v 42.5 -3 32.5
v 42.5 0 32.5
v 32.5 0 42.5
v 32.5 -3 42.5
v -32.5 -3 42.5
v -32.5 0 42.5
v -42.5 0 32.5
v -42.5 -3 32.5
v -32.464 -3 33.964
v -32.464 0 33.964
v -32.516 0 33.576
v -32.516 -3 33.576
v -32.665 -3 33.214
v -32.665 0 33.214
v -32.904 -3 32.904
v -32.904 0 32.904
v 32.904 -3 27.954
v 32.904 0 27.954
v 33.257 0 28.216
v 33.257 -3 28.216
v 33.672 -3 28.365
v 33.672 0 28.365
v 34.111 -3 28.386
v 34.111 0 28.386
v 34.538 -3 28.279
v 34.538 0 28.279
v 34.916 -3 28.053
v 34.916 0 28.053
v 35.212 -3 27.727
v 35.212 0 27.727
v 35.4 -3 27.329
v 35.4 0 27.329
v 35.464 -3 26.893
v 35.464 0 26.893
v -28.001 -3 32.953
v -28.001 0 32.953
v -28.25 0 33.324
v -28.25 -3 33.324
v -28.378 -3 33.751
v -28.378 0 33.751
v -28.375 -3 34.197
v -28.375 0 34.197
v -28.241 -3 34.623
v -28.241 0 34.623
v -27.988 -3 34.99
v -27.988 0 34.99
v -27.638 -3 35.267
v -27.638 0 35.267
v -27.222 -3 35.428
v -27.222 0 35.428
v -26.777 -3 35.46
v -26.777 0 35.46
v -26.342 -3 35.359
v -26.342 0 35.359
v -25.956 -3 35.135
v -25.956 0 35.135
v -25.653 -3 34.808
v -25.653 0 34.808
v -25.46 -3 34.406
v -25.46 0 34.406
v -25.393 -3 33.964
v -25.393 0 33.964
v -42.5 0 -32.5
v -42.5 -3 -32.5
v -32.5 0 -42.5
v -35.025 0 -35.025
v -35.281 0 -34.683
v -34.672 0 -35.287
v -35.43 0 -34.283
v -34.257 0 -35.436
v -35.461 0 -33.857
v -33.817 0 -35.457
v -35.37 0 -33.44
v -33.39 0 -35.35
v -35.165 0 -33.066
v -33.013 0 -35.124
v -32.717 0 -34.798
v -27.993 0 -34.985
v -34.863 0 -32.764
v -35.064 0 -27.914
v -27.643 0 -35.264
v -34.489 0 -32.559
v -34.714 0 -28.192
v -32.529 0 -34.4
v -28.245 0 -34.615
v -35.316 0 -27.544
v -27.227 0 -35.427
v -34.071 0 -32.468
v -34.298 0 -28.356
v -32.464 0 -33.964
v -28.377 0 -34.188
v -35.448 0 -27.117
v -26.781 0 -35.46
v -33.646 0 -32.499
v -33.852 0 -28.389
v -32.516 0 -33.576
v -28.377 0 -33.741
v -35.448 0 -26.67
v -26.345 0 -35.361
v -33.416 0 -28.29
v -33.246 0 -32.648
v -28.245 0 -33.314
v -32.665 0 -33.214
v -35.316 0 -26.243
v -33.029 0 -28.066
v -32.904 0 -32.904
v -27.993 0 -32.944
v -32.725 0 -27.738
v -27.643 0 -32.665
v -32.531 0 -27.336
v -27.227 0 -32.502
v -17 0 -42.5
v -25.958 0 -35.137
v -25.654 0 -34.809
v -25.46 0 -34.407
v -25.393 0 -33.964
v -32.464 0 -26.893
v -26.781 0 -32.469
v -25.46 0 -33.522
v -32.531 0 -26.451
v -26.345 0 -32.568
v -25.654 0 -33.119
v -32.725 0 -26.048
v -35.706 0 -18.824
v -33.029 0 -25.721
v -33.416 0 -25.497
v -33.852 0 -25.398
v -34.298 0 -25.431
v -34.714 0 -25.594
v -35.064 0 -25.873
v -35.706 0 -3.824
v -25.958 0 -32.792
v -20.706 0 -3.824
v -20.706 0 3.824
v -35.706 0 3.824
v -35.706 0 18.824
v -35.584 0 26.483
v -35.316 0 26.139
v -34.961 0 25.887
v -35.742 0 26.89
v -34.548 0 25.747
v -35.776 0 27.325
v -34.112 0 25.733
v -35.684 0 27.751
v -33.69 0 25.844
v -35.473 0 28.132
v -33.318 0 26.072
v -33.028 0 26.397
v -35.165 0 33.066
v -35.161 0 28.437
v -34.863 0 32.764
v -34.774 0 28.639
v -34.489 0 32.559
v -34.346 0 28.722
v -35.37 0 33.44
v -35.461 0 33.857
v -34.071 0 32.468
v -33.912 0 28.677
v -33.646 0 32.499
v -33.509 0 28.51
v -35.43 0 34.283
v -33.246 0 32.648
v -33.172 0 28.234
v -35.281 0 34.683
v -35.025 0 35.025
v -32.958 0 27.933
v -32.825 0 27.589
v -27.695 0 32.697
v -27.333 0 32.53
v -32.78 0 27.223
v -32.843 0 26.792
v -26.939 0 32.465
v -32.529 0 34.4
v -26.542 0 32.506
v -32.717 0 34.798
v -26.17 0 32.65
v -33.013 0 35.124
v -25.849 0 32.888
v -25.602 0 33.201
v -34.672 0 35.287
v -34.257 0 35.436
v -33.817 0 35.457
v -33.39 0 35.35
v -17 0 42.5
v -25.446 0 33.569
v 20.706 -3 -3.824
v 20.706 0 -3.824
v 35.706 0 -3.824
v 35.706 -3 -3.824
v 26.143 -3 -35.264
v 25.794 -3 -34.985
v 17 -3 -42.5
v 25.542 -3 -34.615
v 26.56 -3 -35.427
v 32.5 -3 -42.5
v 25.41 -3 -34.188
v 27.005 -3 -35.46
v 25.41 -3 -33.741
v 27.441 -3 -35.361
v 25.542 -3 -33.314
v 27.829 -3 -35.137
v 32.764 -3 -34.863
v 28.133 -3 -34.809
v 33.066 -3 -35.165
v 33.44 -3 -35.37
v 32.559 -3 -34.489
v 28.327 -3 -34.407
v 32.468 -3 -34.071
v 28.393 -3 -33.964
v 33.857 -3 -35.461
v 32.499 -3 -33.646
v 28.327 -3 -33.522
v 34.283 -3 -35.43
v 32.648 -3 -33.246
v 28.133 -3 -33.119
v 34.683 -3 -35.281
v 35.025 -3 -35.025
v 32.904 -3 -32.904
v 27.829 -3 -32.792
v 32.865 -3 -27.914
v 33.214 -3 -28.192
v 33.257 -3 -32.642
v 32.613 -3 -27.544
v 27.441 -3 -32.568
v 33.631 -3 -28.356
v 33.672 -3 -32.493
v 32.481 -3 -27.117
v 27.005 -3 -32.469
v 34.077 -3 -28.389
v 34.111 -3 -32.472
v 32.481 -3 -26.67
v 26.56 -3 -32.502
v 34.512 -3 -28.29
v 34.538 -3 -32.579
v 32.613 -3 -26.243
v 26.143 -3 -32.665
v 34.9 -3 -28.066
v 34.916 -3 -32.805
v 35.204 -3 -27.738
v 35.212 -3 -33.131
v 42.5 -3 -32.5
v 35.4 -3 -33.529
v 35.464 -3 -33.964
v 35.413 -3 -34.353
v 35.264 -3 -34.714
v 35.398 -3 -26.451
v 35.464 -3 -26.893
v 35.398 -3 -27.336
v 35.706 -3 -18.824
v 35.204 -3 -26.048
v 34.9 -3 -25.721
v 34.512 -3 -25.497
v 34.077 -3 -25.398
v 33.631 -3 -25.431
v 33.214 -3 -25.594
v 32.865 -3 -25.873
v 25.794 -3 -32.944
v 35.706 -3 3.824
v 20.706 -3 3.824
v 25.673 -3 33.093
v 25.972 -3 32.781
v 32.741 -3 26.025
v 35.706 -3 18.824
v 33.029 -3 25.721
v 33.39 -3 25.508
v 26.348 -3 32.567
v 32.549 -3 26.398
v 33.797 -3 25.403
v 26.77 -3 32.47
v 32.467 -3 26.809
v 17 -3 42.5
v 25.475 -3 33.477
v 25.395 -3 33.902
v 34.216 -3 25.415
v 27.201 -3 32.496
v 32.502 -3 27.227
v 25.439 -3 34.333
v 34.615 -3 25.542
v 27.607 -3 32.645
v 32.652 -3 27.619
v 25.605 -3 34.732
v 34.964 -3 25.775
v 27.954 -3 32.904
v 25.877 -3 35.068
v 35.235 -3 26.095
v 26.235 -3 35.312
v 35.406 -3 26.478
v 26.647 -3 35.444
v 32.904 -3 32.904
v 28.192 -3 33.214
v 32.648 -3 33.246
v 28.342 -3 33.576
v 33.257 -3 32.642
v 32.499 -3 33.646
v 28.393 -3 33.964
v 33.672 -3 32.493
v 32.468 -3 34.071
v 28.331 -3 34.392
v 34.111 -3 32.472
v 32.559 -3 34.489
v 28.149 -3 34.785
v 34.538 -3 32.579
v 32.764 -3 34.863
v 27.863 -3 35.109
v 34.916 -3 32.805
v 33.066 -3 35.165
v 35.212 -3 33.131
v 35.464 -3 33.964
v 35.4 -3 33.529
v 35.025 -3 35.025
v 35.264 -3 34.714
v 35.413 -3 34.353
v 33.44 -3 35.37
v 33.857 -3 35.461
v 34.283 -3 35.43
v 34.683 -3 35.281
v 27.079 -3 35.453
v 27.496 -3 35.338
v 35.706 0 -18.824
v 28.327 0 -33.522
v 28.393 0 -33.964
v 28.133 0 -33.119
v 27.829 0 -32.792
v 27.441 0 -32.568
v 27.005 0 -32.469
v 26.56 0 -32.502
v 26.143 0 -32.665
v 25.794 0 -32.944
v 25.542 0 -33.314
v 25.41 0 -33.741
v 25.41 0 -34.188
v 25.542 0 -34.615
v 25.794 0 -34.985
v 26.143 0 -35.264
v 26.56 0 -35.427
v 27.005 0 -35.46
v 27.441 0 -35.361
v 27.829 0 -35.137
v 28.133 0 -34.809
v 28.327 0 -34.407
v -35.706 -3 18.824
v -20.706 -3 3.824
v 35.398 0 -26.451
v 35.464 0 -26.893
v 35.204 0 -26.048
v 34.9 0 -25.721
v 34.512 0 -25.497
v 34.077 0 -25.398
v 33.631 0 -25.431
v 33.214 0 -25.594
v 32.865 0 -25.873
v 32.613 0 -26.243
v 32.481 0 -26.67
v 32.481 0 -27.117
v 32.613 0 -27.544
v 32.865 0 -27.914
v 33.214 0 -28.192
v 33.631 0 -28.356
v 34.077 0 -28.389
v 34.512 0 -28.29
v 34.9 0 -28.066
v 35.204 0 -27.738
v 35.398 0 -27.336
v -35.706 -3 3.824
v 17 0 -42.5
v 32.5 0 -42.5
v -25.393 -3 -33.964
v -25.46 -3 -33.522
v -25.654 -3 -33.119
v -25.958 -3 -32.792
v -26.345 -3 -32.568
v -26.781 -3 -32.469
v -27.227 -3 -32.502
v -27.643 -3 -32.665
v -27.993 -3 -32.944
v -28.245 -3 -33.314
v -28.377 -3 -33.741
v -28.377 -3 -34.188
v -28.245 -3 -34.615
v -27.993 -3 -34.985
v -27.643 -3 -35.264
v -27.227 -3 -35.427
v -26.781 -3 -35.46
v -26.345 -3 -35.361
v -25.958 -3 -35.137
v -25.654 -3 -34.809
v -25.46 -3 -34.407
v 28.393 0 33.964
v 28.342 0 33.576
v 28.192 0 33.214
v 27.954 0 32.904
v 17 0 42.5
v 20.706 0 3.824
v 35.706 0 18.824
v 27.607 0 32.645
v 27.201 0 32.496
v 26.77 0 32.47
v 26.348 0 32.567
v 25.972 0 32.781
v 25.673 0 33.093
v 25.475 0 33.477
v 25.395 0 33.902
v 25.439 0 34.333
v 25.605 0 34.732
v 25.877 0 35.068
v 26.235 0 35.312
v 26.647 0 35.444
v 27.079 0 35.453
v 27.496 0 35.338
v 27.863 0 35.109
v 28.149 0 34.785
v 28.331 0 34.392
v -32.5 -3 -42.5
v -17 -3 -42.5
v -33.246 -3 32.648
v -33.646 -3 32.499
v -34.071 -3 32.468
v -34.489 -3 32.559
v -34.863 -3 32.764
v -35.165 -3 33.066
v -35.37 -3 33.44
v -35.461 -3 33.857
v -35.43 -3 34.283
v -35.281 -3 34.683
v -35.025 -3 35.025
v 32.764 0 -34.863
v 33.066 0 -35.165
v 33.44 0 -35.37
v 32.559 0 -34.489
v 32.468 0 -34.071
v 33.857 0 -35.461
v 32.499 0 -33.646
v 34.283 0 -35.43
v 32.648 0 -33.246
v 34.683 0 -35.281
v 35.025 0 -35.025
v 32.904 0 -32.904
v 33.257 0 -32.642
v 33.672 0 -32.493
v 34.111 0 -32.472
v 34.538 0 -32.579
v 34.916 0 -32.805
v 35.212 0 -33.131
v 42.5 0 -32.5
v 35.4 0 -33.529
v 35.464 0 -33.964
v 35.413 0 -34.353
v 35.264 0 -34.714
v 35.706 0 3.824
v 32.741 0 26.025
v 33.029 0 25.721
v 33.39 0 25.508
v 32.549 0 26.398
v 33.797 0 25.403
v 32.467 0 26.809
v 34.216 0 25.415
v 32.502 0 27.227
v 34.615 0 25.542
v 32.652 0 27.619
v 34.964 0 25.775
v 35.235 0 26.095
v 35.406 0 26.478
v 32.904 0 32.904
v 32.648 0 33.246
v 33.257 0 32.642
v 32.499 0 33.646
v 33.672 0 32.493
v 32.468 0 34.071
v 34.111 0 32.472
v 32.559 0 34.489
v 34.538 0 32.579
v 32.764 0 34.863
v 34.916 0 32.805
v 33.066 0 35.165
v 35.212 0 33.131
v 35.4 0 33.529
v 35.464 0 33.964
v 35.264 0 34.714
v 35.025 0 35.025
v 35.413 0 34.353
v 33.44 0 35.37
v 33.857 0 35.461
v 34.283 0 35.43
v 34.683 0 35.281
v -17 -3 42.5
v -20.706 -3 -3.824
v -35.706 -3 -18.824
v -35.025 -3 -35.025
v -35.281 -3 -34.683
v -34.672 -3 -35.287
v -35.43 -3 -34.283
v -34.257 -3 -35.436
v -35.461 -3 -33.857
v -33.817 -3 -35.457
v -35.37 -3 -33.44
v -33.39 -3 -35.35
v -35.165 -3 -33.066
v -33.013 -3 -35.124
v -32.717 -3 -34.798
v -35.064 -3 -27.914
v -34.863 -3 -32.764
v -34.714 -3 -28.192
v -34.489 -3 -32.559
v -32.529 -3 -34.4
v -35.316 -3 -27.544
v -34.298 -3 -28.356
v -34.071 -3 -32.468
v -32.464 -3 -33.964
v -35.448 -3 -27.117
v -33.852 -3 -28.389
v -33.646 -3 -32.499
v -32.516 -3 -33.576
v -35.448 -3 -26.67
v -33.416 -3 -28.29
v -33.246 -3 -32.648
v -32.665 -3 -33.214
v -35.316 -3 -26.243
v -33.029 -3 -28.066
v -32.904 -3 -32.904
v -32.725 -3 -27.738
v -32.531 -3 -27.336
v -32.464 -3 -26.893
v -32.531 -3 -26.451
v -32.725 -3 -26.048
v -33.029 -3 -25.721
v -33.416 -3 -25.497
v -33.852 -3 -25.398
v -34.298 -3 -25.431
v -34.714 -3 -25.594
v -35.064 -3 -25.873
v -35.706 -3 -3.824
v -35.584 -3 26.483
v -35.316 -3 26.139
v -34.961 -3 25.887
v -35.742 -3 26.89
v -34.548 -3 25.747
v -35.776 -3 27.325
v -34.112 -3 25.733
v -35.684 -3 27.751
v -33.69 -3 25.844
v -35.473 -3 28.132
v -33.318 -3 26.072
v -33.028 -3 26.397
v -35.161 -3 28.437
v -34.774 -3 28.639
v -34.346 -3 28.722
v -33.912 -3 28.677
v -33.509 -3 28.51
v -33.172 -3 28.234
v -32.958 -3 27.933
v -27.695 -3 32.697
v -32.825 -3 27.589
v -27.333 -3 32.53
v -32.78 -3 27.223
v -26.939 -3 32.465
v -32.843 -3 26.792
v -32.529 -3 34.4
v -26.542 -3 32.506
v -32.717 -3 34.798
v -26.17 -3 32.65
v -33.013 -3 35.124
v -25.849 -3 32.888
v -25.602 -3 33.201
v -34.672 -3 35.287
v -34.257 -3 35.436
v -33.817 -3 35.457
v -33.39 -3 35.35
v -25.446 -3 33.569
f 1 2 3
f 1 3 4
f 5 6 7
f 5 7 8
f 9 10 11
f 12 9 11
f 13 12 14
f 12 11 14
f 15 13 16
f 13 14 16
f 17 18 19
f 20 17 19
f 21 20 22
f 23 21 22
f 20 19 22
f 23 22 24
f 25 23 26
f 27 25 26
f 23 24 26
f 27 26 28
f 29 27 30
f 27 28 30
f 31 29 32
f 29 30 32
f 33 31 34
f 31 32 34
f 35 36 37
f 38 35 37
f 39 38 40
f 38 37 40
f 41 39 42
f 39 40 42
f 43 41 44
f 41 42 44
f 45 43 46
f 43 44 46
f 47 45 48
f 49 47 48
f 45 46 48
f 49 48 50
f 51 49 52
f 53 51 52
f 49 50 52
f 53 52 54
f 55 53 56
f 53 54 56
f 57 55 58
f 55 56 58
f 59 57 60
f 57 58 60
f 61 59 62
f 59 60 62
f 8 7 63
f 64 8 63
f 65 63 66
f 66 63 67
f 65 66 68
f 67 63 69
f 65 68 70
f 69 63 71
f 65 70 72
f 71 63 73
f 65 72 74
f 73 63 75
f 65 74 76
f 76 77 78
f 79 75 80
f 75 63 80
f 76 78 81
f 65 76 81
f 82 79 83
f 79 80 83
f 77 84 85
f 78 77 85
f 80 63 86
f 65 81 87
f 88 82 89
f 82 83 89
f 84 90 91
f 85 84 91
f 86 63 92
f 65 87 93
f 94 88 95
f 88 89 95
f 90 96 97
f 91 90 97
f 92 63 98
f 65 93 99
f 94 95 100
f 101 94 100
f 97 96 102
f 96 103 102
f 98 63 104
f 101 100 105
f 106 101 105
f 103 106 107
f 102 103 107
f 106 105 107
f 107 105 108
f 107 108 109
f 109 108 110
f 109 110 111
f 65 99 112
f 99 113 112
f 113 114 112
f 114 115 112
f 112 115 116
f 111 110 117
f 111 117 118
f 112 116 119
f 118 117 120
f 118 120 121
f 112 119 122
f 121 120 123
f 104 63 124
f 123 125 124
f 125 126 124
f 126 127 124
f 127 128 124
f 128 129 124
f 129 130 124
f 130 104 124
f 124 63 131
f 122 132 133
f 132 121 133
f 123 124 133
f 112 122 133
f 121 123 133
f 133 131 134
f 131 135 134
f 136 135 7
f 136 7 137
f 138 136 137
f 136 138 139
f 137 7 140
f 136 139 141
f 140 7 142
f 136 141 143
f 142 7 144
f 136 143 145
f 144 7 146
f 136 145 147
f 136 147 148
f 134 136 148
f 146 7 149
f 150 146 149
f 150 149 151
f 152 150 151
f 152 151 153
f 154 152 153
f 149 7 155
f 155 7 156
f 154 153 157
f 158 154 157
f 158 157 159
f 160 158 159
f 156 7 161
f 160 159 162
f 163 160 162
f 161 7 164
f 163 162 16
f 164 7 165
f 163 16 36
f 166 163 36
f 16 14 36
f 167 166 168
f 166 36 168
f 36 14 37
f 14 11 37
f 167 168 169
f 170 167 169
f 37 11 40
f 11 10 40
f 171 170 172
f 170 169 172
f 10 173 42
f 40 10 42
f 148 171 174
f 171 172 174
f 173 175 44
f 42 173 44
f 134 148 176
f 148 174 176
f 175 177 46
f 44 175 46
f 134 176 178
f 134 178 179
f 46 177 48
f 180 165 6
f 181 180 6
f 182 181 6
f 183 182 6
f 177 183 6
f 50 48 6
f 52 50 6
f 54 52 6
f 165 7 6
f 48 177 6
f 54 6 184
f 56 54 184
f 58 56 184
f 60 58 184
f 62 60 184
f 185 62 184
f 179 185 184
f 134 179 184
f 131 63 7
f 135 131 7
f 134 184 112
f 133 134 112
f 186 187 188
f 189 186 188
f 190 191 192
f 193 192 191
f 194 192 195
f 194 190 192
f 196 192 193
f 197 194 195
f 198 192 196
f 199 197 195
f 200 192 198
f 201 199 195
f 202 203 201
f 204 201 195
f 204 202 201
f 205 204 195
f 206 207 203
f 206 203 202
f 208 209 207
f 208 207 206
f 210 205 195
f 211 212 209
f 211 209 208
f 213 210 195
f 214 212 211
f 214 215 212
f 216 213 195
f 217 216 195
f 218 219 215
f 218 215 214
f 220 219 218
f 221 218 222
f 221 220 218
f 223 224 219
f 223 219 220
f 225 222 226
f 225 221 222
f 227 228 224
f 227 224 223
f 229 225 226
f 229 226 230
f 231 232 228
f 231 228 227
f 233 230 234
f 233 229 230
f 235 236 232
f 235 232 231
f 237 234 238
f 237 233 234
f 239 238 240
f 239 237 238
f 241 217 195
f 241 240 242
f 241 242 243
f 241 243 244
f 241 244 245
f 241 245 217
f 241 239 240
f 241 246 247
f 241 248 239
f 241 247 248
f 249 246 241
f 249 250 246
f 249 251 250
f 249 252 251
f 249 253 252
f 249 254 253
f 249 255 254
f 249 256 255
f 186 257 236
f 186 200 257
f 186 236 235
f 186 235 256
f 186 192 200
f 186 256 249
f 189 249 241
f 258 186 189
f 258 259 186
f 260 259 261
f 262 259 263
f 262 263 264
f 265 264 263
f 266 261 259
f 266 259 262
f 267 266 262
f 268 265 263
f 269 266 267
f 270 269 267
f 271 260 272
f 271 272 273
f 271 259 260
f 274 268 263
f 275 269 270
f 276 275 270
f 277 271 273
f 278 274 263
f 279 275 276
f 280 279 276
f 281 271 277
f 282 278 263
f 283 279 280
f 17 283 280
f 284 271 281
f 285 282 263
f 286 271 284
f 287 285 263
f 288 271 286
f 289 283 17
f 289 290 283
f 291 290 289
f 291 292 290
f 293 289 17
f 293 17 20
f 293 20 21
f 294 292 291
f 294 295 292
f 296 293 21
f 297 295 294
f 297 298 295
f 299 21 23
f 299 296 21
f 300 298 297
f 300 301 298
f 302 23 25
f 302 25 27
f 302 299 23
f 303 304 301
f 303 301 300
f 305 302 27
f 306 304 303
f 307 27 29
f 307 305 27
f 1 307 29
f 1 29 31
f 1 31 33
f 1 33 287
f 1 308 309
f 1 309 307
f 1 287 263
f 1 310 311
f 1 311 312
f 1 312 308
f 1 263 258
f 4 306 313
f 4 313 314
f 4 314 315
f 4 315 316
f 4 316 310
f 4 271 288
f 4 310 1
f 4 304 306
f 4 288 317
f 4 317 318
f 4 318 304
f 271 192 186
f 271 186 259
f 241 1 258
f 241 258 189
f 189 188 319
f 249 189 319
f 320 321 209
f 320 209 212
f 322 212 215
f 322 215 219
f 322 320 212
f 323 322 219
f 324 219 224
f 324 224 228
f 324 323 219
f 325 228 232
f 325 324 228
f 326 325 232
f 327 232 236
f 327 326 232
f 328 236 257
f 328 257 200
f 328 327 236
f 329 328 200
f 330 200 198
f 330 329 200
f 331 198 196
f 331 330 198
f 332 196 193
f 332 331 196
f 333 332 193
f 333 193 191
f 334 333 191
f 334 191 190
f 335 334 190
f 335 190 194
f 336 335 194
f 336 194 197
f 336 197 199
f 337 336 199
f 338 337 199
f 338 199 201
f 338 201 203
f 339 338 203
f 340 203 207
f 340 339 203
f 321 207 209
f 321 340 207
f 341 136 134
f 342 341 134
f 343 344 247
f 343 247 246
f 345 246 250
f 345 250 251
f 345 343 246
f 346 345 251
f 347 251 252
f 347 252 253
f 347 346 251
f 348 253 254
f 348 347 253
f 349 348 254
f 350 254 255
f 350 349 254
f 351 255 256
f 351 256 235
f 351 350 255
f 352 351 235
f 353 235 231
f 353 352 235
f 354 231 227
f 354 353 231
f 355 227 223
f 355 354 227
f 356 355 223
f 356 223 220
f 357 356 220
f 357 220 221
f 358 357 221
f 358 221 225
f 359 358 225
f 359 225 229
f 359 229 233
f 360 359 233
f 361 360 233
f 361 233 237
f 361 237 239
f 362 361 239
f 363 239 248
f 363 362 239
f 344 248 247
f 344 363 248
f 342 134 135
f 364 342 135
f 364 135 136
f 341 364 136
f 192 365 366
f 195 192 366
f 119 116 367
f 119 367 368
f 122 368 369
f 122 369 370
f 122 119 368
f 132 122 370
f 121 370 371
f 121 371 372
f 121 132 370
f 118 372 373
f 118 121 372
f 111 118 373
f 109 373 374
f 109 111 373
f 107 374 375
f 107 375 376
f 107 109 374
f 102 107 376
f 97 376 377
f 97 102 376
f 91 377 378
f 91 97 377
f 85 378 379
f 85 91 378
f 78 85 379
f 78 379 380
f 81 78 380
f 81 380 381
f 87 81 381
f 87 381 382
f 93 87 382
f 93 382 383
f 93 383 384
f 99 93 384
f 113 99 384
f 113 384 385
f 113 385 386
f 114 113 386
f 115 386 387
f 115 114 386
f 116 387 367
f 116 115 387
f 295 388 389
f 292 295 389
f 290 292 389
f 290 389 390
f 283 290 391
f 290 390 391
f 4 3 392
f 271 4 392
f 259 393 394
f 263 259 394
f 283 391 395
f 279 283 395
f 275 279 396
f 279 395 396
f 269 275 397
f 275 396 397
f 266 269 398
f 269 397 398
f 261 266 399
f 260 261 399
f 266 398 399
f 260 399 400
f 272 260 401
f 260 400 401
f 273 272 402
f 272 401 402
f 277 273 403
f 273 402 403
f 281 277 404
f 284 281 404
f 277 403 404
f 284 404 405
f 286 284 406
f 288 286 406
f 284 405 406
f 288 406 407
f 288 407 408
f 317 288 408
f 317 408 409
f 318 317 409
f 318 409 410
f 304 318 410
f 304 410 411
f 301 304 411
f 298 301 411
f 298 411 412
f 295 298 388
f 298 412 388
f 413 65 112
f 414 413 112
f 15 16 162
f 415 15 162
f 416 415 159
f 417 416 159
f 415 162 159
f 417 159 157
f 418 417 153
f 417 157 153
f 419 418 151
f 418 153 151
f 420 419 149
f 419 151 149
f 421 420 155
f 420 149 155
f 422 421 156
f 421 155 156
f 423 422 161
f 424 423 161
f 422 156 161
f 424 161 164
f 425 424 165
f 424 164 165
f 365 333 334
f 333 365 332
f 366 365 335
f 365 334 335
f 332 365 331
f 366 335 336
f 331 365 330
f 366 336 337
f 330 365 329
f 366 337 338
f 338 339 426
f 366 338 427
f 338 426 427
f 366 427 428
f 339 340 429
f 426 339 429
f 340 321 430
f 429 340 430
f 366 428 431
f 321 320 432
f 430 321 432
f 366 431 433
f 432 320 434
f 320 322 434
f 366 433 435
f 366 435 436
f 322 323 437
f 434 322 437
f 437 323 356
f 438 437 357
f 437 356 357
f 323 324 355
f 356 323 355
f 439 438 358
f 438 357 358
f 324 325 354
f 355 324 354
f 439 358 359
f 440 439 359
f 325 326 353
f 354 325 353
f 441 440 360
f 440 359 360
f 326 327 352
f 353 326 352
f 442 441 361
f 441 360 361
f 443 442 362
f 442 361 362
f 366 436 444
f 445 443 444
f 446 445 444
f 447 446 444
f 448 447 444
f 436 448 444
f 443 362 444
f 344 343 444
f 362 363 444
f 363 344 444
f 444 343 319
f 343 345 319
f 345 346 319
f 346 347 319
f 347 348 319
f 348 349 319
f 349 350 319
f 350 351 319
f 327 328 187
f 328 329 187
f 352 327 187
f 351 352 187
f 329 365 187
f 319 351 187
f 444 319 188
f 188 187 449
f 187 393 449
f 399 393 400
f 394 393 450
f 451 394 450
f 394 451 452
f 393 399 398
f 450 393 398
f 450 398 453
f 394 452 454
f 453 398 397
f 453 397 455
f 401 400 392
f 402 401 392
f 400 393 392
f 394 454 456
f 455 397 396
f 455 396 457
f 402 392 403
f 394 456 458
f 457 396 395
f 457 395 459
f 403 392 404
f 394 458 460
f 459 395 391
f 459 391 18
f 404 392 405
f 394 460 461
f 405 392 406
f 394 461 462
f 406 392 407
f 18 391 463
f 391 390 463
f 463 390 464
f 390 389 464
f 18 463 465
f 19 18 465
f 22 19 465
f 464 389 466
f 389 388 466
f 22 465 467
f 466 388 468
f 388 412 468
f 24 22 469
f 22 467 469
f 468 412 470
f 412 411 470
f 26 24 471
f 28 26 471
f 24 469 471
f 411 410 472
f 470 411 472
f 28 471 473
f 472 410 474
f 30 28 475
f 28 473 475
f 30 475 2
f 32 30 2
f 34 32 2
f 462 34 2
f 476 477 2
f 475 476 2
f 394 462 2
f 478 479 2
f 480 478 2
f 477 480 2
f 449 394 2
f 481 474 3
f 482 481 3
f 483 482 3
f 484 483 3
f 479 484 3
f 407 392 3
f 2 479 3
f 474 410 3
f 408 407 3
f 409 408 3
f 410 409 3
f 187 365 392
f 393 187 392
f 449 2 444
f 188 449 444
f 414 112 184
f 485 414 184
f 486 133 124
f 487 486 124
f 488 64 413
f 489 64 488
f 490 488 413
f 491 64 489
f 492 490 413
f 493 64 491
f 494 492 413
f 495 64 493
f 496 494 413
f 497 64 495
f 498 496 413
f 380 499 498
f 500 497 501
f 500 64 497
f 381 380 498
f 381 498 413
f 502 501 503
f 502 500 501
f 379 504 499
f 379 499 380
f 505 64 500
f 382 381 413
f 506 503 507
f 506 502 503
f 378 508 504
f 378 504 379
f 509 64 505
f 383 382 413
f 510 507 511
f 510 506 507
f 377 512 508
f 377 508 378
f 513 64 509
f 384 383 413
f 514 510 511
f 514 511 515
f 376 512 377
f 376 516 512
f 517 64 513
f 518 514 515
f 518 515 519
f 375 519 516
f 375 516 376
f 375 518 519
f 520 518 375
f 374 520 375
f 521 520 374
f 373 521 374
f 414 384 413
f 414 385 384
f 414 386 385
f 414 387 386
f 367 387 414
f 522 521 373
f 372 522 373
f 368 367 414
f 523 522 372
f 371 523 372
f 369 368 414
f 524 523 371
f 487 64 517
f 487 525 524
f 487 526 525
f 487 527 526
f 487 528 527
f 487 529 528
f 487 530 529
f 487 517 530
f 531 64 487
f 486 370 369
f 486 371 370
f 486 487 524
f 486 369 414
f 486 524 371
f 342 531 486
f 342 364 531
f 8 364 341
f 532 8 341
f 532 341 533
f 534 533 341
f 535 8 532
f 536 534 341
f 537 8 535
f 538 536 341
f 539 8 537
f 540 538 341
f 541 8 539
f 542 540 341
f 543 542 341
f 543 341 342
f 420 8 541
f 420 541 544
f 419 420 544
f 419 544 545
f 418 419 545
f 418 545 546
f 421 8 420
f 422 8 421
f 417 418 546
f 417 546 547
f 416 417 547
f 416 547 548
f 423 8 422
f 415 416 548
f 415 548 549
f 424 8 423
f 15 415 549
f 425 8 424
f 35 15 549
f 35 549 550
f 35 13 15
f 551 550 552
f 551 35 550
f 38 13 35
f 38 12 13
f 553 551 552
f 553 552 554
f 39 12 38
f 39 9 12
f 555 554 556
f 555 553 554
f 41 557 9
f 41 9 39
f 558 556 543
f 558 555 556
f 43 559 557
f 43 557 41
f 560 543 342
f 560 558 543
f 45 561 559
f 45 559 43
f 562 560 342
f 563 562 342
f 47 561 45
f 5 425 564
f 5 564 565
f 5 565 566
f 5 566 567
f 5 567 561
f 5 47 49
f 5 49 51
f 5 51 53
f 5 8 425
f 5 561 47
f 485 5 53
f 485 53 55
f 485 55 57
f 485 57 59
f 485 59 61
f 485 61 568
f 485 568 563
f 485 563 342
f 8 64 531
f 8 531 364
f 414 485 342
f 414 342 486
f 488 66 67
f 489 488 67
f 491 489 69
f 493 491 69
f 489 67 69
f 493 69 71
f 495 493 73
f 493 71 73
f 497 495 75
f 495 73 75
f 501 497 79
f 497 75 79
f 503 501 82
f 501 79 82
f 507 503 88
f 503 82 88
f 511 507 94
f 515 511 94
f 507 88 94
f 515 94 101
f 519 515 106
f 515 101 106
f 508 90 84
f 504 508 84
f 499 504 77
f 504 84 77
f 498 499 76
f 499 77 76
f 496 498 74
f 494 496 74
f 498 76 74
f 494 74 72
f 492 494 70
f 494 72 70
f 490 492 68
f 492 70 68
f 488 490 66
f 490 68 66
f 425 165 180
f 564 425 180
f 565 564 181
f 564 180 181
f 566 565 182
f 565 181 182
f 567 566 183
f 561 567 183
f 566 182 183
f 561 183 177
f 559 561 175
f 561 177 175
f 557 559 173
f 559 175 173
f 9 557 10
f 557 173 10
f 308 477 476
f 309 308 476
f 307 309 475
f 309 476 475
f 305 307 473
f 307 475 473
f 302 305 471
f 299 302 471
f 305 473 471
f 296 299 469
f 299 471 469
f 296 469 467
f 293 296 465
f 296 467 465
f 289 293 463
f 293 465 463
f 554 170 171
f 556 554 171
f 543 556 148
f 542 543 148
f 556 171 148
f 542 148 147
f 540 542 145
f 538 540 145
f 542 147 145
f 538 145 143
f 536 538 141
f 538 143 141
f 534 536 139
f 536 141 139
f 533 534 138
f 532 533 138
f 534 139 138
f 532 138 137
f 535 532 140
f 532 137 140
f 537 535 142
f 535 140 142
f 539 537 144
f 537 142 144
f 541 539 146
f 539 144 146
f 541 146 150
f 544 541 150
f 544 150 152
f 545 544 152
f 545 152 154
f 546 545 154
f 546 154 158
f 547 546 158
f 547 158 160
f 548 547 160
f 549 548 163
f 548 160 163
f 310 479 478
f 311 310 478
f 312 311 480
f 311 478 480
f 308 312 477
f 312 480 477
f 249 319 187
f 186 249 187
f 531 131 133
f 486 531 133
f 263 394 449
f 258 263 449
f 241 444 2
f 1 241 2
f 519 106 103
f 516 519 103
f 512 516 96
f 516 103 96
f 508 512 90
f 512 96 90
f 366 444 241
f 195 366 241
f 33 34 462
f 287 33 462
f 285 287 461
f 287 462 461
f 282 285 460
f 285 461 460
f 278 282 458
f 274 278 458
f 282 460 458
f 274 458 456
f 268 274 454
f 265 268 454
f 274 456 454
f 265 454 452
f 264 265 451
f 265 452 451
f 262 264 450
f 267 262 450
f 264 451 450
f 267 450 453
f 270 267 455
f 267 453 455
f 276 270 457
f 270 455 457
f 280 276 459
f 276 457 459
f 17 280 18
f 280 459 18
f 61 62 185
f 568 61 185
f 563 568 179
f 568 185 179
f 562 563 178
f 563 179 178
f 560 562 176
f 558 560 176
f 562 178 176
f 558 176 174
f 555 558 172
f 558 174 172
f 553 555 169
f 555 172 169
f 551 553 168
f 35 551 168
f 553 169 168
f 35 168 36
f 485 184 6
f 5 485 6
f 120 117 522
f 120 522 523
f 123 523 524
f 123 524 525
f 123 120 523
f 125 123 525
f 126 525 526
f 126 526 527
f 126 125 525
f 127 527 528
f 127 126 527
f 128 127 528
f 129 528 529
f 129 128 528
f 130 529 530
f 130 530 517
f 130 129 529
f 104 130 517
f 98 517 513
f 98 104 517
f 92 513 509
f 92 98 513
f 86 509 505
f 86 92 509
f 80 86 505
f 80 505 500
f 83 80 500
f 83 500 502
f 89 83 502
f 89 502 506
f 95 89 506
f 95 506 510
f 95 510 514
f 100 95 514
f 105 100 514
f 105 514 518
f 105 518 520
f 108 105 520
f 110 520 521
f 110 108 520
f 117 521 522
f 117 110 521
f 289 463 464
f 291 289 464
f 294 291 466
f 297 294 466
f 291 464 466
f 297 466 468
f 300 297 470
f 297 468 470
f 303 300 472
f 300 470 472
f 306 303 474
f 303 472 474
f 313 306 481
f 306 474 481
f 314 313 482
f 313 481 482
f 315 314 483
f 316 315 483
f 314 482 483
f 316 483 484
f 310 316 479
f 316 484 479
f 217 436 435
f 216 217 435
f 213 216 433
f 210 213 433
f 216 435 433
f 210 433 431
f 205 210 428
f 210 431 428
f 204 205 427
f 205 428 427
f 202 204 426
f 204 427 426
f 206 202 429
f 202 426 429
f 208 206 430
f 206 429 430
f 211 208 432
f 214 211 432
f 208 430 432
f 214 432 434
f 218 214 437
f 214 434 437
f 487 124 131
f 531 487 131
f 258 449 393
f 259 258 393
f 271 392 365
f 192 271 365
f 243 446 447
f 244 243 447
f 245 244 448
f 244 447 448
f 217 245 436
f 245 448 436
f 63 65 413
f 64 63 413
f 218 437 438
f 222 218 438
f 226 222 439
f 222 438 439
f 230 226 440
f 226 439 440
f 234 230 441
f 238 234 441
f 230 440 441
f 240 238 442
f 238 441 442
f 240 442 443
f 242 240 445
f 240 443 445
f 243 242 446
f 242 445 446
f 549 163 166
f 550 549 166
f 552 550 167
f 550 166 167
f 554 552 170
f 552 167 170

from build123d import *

# Parameters (mm, degrees)
F0_R      = 1.5
F1_DEPTH  = 3
F2_SIZE   = 10
F2_2_SIZE = 10


with BuildPart() as f1:
    # F0 (on Front) → F1 (new body)
    with BuildSketch(Plane.XZ):
        Polygon((42.5, 32.5), (42.5, 42.5), (37.5, 37.5), align=None)
        Polygon((37.5, 37.5), (42.5, 42.5), (32.5, 42.5), align=None)
        Polygon((42.5, -32.5), (42.5, 32.5), (37.5, 37.5), (32.5, 42.5), (17, 42.5), (17, -42.5), (32.5, -42.5), (37.5, -37.5), align=None)
        with Locations((26.8933982822, -33.9644660941)):
            Circle(F0_R, mode=Mode.SUBTRACT)
        with BuildLine():
            ThreePointArc((35.4644660941, -33.9644660941), (35.3502853928, -34.5384912426), (35.0251262658, -35.0251262658))
            ThreePointArc((35.0251262658, -35.0251262658), (32.9038059223, -35.0251262658), (32.9038059223, -32.9038059223))
            ThreePointArc((32.9038059223, -32.9038059223), (34.5384912426, -32.5786467953), (35.4644660941, -33.9644660941))
        make_face(mode=Mode.SUBTRACT)
        with Locations((33.9644660941, -26.8933982822)):
            Circle(F0_R, mode=Mode.SUBTRACT)
        Polygon((20.7055291533, -3.823871389), (35.7055291533, -3.823871389), (35.7055291533, -18.823871389), align=None, mode=Mode.SUBTRACT)
        Polygon((35.7055291533, 3.823871389), (20.7055291533, 3.823871389), (35.7055291533, 18.823871389), align=None, mode=Mode.SUBTRACT)
        with BuildLine():
            ThreePointArc((35.4644660941, 26.8933982822), (33.3904409455, 25.5075789834), (32.9038059223, 27.954058454))
            ThreePointArc((32.9038059223, 27.954058454), (34.5384912426, 28.279217581), (35.4644660941, 26.8933982822))
        make_face(mode=Mode.SUBTRACT)
        with BuildLine():
            ThreePointArc((28.3933982822, 33.9644660941), (28.279217581, 33.3904409455), (27.954058454, 32.9038059223))
            ThreePointArc((27.954058454, 32.9038059223), (25.5075789834, 34.5384912426), (28.3933982822, 33.9644660941))
        make_face(mode=Mode.SUBTRACT)
        with BuildLine():
            ThreePointArc((32.9038059223, 32.9038059223), (32.9038059223, 35.0251262658), (35.0251262658, 35.0251262658))
            ThreePointArc((35.0251262658, 35.0251262658), (35.3502853928, 34.5384912426), (35.4644660941, 33.9644660941))
            ThreePointArc((35.4644660941, 33.9644660941), (34.5384912426, 32.5786467953), (32.9038059223, 32.9038059223))
        make_face(mode=Mode.SUBTRACT)
        Polygon((42.5, -42.5), (42.5, -32.5), (37.5, -37.5), align=None)
        Polygon((32.5, -42.5), (42.5, -42.5), (37.5, -37.5), align=None)
    extrude(amount=F1_DEPTH)

    # F2
    f2_edges = [f1.edges().sort_by_distance(p)[0] for p in [
        (42.5, -1.5, 42.5),
        (42.5, -1.5, -42.5),
    ]]
    chamfer(f2_edges, length=F2_SIZE)


with BuildPart() as f1b:
    # F0 (on Front) → F1, piece 2 (new body)
    with BuildSketch(Plane.XZ):
        Polygon((-37.5, 37.5), (-42.5, 42.5), (-42.5, 32.5), align=None)
        Polygon((-32.5, 42.5), (-42.5, 42.5), (-37.5, 37.5), align=None)
        Polygon((-37.5, 37.5), (-42.5, 32.5), (-42.5, -32.5), (-37.5, -37.5), (-32.5, -42.5), (-17, -42.5), (-17, 42.5), (-32.5, 42.5), align=None)
        with BuildLine():
            ThreePointArc((-32.4644660941, -33.9644660941), (-33.3904409455, -35.3502853928), (-35.0251262658, -35.0251262658))
            ThreePointArc((-35.0251262658, -35.0251262658), (-35.0251262658, -32.9038059223), (-32.9038059223, -32.9038059223))
            ThreePointArc((-32.9038059223, -32.9038059223), (-32.5786467953, -33.3904409455), (-32.4644660941, -33.9644660941))
        make_face(mode=Mode.SUBTRACT)
        with Locations((-26.8933982822, -33.9644660941)):
            Circle(F0_R, mode=Mode.SUBTRACT)
        with Locations((-33.9644660941, -26.8933982822)):
            Circle(F0_R, mode=Mode.SUBTRACT)
        Polygon((-20.7055291533, -3.823871389), (-35.7055291533, -18.823871389), (-35.7055291533, -3.823871389), align=None, mode=Mode.SUBTRACT)
        Polygon((-35.7055291533, 3.823871389), (-35.7055291533, 18.823871389), (-20.7055291533, 3.823871389), align=None, mode=Mode.SUBTRACT)
        with BuildLine():
            ThreePointArc((-32.7795228992, 27.2231633162), (-35.6780717969, 26.6808894181), (-33.1716042066, 28.2343587329))
            ThreePointArc((-33.1716042066, 28.2343587329), (-32.8809740014, 27.7654372144), (-32.7795228992, 27.2231633162))
        make_face(mode=Mode.SUBTRACT)
        with BuildLine():
            ThreePointArc((-32.9038059223, 32.9038059223), (-35.0251262658, 32.9038059223), (-35.0251262658, 35.0251262658))
            ThreePointArc((-35.0251262658, 35.0251262658), (-33.3904409455, 35.3502853928), (-32.4644660941, 33.9644660941))
            ThreePointArc((-32.4644660941, 33.9644660941), (-32.5786467953, 33.3904409455), (-32.9038059223, 32.9038059223))
        make_face(mode=Mode.SUBTRACT)
        with BuildLine():
            ThreePointArc((-25.3933982822, 33.9644660941), (-26.3511243841, 32.5659171963), (-28.0013169747, 32.9532706774))
            ThreePointArc((-28.0013169747, 32.9532706774), (-27.4356721803, 35.3630149918), (-25.3933982822, 33.9644660941))
        make_face(mode=Mode.SUBTRACT)
        Polygon((-37.5, -37.5), (-42.5, -32.5), (-42.5, -42.5), align=None)
        Polygon((-37.5, -37.5), (-42.5, -42.5), (-32.5, -42.5), align=None)
    extrude(amount=F1_DEPTH)

    # F2#2
    f2_2_edges = [f1b.edges().sort_by_distance(p)[0] for p in [
        (-42.5, -1.5, 42.5),
        (-42.5, -1.5, -42.5),
    ]]
    chamfer(f2_2_edges, length=F2_2_SIZE)


solid = Compound([f1.part, f1b.part])
